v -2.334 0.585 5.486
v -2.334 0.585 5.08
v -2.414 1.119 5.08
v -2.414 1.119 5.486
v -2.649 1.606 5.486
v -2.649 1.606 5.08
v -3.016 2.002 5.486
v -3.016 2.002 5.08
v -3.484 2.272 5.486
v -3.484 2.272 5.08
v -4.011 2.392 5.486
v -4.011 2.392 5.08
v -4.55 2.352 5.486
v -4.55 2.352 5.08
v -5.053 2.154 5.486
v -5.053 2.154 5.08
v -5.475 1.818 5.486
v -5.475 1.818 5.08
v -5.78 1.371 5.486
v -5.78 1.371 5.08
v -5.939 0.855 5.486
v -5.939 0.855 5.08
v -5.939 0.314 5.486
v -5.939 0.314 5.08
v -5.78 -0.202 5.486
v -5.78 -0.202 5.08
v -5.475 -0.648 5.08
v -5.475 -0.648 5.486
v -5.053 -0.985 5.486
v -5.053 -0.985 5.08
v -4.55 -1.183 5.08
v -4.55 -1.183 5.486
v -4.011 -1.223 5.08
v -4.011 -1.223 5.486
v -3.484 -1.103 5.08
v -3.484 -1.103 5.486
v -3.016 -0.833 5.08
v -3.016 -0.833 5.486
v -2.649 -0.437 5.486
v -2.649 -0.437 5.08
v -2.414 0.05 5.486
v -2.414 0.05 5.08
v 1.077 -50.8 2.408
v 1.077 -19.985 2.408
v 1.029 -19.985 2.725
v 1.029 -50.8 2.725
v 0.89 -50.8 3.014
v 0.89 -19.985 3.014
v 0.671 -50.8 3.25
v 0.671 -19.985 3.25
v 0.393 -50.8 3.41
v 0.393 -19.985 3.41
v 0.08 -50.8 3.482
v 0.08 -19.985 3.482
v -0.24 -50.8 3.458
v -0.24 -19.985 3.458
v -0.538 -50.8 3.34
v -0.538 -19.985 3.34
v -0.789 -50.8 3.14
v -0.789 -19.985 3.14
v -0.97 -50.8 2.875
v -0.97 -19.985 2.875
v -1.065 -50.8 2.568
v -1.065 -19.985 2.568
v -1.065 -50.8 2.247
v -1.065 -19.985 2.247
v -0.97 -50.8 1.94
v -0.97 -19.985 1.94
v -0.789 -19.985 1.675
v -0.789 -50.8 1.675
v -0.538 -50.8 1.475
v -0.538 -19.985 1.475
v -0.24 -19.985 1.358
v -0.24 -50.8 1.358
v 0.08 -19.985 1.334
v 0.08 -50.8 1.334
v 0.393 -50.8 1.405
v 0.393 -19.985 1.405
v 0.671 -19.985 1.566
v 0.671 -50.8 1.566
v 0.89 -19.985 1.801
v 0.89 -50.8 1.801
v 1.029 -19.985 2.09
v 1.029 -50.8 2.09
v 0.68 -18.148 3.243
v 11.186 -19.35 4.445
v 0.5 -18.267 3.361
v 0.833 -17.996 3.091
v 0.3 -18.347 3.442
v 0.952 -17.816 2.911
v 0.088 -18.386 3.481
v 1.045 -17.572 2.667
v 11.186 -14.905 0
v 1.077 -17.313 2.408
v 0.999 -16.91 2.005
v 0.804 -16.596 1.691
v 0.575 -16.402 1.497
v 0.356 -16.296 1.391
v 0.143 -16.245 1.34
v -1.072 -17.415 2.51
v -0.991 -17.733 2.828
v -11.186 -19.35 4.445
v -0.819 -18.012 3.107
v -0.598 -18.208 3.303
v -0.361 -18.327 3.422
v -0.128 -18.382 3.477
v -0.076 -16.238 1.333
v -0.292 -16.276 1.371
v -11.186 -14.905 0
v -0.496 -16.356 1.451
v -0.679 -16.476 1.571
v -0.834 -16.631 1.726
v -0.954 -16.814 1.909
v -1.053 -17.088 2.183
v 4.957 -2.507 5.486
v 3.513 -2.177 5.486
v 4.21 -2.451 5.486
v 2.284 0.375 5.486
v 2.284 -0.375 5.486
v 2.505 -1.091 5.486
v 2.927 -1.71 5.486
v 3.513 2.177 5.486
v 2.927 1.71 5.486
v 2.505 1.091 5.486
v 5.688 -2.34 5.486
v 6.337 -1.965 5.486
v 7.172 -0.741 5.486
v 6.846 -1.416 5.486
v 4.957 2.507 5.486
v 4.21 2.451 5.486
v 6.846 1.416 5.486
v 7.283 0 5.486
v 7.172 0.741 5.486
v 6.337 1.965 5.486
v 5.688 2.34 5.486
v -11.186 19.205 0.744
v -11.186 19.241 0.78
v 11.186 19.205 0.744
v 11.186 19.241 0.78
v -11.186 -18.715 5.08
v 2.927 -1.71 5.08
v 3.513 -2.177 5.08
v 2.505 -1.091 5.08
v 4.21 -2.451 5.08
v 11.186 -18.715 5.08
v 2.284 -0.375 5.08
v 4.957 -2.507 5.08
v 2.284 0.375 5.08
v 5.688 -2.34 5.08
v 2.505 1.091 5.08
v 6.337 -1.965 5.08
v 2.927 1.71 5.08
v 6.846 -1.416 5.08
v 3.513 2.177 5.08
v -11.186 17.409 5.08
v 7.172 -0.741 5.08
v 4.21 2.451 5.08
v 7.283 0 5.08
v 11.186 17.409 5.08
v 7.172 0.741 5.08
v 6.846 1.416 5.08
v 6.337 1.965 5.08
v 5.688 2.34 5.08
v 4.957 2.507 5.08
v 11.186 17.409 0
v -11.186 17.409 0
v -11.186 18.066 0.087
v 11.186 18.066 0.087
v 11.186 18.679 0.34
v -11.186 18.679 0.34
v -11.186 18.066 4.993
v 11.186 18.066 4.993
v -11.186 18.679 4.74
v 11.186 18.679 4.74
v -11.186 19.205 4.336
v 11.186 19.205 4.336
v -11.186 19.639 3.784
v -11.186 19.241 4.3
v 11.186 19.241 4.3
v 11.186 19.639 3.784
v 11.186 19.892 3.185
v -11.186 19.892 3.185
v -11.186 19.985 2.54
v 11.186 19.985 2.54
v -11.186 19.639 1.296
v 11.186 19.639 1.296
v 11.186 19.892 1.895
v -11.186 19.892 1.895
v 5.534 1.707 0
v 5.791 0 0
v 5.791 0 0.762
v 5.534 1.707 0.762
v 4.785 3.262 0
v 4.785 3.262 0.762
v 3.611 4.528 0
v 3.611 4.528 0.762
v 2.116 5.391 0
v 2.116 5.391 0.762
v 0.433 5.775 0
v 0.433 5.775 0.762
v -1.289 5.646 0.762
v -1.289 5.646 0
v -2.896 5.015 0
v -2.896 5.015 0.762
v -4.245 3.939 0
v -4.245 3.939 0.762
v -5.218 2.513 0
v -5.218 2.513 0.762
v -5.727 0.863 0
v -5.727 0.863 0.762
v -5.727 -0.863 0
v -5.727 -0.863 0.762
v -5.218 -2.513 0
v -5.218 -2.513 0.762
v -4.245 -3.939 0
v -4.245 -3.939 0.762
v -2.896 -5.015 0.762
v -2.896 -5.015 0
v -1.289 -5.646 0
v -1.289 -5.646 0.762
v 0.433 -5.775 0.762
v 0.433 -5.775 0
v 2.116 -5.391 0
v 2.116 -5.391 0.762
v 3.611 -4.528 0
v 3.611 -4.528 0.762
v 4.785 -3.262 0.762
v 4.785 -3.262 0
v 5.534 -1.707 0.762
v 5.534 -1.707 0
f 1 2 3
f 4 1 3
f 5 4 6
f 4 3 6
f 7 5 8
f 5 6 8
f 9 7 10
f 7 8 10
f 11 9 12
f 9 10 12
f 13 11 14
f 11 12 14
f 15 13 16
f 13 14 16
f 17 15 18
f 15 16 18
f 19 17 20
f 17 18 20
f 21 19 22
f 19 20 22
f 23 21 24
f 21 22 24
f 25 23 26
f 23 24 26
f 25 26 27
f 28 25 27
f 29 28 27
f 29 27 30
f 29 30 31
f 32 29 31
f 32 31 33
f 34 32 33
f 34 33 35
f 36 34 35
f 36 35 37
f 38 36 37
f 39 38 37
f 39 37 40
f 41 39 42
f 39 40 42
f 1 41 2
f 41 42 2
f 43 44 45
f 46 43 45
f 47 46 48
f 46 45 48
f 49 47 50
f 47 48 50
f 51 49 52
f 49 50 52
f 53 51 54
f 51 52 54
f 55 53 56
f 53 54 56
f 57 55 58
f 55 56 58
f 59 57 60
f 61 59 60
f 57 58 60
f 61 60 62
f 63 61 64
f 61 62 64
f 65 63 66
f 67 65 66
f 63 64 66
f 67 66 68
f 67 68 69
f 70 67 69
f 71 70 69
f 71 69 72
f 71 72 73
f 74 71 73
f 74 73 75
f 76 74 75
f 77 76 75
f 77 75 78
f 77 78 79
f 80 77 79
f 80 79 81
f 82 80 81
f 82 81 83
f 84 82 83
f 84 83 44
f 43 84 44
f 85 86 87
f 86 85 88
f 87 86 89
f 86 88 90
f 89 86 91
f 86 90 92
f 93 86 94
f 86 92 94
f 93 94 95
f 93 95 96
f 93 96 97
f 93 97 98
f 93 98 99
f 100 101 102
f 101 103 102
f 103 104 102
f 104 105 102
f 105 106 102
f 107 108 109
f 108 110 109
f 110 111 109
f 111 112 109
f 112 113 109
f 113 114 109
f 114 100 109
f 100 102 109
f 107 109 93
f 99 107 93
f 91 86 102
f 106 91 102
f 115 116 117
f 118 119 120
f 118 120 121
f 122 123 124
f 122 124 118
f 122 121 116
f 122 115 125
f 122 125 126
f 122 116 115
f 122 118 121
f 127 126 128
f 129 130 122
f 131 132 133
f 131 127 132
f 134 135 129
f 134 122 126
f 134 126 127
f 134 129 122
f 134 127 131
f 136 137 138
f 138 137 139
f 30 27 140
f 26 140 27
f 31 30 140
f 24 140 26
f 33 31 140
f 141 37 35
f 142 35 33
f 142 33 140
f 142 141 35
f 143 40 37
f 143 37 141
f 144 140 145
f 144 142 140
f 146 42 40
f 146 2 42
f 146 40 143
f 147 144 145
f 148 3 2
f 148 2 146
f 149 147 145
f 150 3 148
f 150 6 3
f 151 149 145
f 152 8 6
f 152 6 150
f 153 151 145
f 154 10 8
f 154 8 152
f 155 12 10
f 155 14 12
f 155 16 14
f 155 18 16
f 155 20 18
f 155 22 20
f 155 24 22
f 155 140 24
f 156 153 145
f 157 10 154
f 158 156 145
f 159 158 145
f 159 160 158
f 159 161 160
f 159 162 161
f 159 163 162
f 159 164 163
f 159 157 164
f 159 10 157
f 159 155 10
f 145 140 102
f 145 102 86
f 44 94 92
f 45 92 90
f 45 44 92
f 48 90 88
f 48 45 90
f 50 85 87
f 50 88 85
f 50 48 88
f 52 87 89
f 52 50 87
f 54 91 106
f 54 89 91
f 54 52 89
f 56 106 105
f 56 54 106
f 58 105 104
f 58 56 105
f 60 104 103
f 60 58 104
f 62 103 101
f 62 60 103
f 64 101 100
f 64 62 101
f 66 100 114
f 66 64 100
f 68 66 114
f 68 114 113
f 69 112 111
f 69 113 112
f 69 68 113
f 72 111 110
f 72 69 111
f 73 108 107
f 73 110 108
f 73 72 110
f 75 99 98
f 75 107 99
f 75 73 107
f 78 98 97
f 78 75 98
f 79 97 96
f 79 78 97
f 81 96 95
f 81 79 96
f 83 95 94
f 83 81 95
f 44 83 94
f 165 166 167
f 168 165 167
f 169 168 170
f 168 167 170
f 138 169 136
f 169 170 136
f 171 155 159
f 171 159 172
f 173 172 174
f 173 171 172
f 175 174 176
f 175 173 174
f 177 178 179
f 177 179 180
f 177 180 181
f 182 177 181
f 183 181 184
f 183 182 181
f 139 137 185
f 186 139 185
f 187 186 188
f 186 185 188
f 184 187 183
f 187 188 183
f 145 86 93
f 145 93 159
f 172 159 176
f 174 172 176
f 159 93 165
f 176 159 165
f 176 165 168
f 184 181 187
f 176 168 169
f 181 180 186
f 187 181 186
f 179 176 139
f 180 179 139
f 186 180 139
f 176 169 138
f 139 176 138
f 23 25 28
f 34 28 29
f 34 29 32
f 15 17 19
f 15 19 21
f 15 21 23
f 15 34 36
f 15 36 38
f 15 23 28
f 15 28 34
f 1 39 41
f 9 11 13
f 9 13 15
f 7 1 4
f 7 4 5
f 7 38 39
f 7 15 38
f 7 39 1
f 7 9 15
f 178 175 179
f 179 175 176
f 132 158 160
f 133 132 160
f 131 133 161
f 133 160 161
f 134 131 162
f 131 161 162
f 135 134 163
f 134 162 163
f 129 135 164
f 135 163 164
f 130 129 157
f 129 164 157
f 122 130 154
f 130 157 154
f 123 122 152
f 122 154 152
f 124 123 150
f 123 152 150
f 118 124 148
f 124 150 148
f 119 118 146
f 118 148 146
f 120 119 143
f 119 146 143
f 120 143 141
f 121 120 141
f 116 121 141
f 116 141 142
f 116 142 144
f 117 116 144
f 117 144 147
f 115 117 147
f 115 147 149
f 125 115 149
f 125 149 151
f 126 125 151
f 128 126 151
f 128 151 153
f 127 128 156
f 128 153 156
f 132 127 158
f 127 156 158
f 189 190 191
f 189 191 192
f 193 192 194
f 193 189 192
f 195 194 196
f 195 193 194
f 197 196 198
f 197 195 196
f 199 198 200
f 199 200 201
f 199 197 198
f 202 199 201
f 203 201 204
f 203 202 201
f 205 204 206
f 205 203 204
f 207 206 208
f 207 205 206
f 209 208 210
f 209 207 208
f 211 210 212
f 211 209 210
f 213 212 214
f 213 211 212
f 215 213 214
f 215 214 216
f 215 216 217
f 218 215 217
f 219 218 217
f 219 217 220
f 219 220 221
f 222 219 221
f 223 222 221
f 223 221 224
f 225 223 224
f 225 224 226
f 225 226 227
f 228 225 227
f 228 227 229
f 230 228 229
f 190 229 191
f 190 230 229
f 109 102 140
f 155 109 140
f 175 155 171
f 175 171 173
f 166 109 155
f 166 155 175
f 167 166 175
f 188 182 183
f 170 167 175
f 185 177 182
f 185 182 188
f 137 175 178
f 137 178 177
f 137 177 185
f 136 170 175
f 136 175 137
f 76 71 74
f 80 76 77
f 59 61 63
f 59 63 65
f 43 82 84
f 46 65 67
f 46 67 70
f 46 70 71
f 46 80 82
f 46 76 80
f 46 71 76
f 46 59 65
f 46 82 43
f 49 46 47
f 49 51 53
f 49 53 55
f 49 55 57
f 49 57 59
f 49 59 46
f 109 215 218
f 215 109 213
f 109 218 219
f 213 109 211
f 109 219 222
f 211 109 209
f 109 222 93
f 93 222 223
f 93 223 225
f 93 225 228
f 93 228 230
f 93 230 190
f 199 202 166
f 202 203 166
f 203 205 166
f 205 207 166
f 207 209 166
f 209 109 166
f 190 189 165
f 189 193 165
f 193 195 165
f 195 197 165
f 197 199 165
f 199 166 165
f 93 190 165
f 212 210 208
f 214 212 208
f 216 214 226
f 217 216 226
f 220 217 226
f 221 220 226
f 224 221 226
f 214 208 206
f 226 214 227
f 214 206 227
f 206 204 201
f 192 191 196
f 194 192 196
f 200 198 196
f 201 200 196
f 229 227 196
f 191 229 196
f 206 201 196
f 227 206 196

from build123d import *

# Parameters (mm, degrees)
F0_W         = 22.3715566099
F0_H         = 39.9701632559
F1_DEPTH     = 5.08
F2_R         = 5.7912
F3_DEPTH     = 0.762
F4_R         = 1.0769741324
F5_DEPTH     = 50.8
F6_R         = 1.8127400762
F6_R_2       = 2.5138312633
F7_DEPTH     = 0.4064
F8_SIZE      = 1.27
F9_T4_DEPTH  = 48.4998557676
F9_S5_R      = 1.0769741324
F9_T6_DEPTH  = 26
F10_SIZE     = 1.524
F11_T1_DEPTH = 27.632068852


# Not quite as in the source:
# - a fillet or chamfer that OpenCascade refuses, or shapes differently, is made with other operations: its cross-section is extruded or revolved along the edge and cut away or added


with BuildPart() as f1:
    # F0 (on Top) → F1 (new body)
    with BuildSketch(Plane.XY):
        Rectangle(F0_W, F0_H)
    extrude(amount=F1_DEPTH)

    # F2 (on Top) → F3 (cut)
    with BuildSketch(Plane.XY):
        Circle(F2_R)
    extrude(amount=F3_DEPTH, mode=Mode.SUBTRACT)

    # F4 (on Front) → F5 (join)
    with BuildSketch(Plane.XZ):
        with Locations((0, 2.4075380061)):
            Circle(F4_R)
    extrude(amount=F5_DEPTH)

    # F6 (on face) → F7 (join)
    with BuildSketch(Plane.XY.offset(5.08)):
        with Locations((-4.1463463567, 0.584599562)):
            Circle(F6_R)
        with Locations((4.7694612294, 0)):
            Circle(F6_R_2)
    extrude(amount=F7_DEPTH)

    # F8
    f8_edges = [f1.edges().sort_by_distance(p)[0] for p in [
        (0, -19.985082, 5.08),
    ]]
    chamfer(f8_edges, length=F8_SIZE)

    # F9: chamfer of 5.08 on 1 edges, made by hand


with BuildPart() as f9_tool2:
    # F9_s3 → F9_t4 (new body)
    with BuildSketch(Plane.YZ.offset(-24.2499278838)):
        Polygon((-19.985081628, 5.08), (-14.905081628, 0), (-19.985081628, 0), align=None)
    extrude(amount=F9_T4_DEPTH)

    # F9_s5 → F9_t6 (cut, symmetric)
    with BuildSketch(Plane.XZ.offset(17.4)):
        with Locations((0, 2.4075380061)):
            Circle(F9_S5_R)
    extrude(amount=F9_T6_DEPTH, both=True, mode=Mode.SUBTRACT)


with BuildPart() as f1_1:
    add(f1.part)

    # F9_t1: cut F9_tool2
    add(f9_tool2.part, mode=Mode.SUBTRACT)

    # F10
    f10_edges = [f1_1.edges().sort_by_distance(p)[0] for p in [
        (0, 19.985082, 5.08),
        (0, 19.985082, 0),
    ]]
    chamfer(f10_edges, length=F10_SIZE)

    # F11: fillet of radius 2.54 on 4 edges, made by hand

    # F11_s2 → F11_t1 (cut)
    with BuildSketch(Plane.YZ.offset(-13.816034426)):
        with BuildLine():
            ThreePointArc((17.4089791795, 5.08), (18.3809950977, 4.8866540126), (19.2050304038, 4.3360512242))
            Line((19.2050304038, 4.3360512242), (18.461081628, 5.08))
            Line((18.461081628, 5.08), (17.4089791795, 5.08))
        make_face()
        with BuildLine():
            ThreePointArc((19.2411328522, 4.2999487758), (19.7917356405, 3.4759134698), (19.985081628, 2.5038975516))
            Line((19.985081628, 2.5038975516), (19.985081628, 3.556))
            Line((19.985081628, 3.556), (19.2411328522, 4.2999487758))
        make_face()
        with BuildLine():
            ThreePointArc((19.2411328522, 0.7800512242), (19.7917356405, 1.6040865302), (19.985081628, 2.5761024484))
            Line((19.985081628, 2.5761024484), (19.985081628, 1.524))
            Line((19.985081628, 1.524), (19.2411328522, 0.7800512242))
        make_face()
        with BuildLine():
            ThreePointArc((17.4089791795, 0), (18.3809950977, 0.1933459874), (19.2050304038, 0.7439487758))
            Line((19.2050304038, 0.7439487758), (18.461081628, 0))
            Line((18.461081628, 0), (17.4089791795, 0))
        make_face()
    extrude(amount=F11_T1_DEPTH, mode=Mode.SUBTRACT)


solid = f1_1.part
